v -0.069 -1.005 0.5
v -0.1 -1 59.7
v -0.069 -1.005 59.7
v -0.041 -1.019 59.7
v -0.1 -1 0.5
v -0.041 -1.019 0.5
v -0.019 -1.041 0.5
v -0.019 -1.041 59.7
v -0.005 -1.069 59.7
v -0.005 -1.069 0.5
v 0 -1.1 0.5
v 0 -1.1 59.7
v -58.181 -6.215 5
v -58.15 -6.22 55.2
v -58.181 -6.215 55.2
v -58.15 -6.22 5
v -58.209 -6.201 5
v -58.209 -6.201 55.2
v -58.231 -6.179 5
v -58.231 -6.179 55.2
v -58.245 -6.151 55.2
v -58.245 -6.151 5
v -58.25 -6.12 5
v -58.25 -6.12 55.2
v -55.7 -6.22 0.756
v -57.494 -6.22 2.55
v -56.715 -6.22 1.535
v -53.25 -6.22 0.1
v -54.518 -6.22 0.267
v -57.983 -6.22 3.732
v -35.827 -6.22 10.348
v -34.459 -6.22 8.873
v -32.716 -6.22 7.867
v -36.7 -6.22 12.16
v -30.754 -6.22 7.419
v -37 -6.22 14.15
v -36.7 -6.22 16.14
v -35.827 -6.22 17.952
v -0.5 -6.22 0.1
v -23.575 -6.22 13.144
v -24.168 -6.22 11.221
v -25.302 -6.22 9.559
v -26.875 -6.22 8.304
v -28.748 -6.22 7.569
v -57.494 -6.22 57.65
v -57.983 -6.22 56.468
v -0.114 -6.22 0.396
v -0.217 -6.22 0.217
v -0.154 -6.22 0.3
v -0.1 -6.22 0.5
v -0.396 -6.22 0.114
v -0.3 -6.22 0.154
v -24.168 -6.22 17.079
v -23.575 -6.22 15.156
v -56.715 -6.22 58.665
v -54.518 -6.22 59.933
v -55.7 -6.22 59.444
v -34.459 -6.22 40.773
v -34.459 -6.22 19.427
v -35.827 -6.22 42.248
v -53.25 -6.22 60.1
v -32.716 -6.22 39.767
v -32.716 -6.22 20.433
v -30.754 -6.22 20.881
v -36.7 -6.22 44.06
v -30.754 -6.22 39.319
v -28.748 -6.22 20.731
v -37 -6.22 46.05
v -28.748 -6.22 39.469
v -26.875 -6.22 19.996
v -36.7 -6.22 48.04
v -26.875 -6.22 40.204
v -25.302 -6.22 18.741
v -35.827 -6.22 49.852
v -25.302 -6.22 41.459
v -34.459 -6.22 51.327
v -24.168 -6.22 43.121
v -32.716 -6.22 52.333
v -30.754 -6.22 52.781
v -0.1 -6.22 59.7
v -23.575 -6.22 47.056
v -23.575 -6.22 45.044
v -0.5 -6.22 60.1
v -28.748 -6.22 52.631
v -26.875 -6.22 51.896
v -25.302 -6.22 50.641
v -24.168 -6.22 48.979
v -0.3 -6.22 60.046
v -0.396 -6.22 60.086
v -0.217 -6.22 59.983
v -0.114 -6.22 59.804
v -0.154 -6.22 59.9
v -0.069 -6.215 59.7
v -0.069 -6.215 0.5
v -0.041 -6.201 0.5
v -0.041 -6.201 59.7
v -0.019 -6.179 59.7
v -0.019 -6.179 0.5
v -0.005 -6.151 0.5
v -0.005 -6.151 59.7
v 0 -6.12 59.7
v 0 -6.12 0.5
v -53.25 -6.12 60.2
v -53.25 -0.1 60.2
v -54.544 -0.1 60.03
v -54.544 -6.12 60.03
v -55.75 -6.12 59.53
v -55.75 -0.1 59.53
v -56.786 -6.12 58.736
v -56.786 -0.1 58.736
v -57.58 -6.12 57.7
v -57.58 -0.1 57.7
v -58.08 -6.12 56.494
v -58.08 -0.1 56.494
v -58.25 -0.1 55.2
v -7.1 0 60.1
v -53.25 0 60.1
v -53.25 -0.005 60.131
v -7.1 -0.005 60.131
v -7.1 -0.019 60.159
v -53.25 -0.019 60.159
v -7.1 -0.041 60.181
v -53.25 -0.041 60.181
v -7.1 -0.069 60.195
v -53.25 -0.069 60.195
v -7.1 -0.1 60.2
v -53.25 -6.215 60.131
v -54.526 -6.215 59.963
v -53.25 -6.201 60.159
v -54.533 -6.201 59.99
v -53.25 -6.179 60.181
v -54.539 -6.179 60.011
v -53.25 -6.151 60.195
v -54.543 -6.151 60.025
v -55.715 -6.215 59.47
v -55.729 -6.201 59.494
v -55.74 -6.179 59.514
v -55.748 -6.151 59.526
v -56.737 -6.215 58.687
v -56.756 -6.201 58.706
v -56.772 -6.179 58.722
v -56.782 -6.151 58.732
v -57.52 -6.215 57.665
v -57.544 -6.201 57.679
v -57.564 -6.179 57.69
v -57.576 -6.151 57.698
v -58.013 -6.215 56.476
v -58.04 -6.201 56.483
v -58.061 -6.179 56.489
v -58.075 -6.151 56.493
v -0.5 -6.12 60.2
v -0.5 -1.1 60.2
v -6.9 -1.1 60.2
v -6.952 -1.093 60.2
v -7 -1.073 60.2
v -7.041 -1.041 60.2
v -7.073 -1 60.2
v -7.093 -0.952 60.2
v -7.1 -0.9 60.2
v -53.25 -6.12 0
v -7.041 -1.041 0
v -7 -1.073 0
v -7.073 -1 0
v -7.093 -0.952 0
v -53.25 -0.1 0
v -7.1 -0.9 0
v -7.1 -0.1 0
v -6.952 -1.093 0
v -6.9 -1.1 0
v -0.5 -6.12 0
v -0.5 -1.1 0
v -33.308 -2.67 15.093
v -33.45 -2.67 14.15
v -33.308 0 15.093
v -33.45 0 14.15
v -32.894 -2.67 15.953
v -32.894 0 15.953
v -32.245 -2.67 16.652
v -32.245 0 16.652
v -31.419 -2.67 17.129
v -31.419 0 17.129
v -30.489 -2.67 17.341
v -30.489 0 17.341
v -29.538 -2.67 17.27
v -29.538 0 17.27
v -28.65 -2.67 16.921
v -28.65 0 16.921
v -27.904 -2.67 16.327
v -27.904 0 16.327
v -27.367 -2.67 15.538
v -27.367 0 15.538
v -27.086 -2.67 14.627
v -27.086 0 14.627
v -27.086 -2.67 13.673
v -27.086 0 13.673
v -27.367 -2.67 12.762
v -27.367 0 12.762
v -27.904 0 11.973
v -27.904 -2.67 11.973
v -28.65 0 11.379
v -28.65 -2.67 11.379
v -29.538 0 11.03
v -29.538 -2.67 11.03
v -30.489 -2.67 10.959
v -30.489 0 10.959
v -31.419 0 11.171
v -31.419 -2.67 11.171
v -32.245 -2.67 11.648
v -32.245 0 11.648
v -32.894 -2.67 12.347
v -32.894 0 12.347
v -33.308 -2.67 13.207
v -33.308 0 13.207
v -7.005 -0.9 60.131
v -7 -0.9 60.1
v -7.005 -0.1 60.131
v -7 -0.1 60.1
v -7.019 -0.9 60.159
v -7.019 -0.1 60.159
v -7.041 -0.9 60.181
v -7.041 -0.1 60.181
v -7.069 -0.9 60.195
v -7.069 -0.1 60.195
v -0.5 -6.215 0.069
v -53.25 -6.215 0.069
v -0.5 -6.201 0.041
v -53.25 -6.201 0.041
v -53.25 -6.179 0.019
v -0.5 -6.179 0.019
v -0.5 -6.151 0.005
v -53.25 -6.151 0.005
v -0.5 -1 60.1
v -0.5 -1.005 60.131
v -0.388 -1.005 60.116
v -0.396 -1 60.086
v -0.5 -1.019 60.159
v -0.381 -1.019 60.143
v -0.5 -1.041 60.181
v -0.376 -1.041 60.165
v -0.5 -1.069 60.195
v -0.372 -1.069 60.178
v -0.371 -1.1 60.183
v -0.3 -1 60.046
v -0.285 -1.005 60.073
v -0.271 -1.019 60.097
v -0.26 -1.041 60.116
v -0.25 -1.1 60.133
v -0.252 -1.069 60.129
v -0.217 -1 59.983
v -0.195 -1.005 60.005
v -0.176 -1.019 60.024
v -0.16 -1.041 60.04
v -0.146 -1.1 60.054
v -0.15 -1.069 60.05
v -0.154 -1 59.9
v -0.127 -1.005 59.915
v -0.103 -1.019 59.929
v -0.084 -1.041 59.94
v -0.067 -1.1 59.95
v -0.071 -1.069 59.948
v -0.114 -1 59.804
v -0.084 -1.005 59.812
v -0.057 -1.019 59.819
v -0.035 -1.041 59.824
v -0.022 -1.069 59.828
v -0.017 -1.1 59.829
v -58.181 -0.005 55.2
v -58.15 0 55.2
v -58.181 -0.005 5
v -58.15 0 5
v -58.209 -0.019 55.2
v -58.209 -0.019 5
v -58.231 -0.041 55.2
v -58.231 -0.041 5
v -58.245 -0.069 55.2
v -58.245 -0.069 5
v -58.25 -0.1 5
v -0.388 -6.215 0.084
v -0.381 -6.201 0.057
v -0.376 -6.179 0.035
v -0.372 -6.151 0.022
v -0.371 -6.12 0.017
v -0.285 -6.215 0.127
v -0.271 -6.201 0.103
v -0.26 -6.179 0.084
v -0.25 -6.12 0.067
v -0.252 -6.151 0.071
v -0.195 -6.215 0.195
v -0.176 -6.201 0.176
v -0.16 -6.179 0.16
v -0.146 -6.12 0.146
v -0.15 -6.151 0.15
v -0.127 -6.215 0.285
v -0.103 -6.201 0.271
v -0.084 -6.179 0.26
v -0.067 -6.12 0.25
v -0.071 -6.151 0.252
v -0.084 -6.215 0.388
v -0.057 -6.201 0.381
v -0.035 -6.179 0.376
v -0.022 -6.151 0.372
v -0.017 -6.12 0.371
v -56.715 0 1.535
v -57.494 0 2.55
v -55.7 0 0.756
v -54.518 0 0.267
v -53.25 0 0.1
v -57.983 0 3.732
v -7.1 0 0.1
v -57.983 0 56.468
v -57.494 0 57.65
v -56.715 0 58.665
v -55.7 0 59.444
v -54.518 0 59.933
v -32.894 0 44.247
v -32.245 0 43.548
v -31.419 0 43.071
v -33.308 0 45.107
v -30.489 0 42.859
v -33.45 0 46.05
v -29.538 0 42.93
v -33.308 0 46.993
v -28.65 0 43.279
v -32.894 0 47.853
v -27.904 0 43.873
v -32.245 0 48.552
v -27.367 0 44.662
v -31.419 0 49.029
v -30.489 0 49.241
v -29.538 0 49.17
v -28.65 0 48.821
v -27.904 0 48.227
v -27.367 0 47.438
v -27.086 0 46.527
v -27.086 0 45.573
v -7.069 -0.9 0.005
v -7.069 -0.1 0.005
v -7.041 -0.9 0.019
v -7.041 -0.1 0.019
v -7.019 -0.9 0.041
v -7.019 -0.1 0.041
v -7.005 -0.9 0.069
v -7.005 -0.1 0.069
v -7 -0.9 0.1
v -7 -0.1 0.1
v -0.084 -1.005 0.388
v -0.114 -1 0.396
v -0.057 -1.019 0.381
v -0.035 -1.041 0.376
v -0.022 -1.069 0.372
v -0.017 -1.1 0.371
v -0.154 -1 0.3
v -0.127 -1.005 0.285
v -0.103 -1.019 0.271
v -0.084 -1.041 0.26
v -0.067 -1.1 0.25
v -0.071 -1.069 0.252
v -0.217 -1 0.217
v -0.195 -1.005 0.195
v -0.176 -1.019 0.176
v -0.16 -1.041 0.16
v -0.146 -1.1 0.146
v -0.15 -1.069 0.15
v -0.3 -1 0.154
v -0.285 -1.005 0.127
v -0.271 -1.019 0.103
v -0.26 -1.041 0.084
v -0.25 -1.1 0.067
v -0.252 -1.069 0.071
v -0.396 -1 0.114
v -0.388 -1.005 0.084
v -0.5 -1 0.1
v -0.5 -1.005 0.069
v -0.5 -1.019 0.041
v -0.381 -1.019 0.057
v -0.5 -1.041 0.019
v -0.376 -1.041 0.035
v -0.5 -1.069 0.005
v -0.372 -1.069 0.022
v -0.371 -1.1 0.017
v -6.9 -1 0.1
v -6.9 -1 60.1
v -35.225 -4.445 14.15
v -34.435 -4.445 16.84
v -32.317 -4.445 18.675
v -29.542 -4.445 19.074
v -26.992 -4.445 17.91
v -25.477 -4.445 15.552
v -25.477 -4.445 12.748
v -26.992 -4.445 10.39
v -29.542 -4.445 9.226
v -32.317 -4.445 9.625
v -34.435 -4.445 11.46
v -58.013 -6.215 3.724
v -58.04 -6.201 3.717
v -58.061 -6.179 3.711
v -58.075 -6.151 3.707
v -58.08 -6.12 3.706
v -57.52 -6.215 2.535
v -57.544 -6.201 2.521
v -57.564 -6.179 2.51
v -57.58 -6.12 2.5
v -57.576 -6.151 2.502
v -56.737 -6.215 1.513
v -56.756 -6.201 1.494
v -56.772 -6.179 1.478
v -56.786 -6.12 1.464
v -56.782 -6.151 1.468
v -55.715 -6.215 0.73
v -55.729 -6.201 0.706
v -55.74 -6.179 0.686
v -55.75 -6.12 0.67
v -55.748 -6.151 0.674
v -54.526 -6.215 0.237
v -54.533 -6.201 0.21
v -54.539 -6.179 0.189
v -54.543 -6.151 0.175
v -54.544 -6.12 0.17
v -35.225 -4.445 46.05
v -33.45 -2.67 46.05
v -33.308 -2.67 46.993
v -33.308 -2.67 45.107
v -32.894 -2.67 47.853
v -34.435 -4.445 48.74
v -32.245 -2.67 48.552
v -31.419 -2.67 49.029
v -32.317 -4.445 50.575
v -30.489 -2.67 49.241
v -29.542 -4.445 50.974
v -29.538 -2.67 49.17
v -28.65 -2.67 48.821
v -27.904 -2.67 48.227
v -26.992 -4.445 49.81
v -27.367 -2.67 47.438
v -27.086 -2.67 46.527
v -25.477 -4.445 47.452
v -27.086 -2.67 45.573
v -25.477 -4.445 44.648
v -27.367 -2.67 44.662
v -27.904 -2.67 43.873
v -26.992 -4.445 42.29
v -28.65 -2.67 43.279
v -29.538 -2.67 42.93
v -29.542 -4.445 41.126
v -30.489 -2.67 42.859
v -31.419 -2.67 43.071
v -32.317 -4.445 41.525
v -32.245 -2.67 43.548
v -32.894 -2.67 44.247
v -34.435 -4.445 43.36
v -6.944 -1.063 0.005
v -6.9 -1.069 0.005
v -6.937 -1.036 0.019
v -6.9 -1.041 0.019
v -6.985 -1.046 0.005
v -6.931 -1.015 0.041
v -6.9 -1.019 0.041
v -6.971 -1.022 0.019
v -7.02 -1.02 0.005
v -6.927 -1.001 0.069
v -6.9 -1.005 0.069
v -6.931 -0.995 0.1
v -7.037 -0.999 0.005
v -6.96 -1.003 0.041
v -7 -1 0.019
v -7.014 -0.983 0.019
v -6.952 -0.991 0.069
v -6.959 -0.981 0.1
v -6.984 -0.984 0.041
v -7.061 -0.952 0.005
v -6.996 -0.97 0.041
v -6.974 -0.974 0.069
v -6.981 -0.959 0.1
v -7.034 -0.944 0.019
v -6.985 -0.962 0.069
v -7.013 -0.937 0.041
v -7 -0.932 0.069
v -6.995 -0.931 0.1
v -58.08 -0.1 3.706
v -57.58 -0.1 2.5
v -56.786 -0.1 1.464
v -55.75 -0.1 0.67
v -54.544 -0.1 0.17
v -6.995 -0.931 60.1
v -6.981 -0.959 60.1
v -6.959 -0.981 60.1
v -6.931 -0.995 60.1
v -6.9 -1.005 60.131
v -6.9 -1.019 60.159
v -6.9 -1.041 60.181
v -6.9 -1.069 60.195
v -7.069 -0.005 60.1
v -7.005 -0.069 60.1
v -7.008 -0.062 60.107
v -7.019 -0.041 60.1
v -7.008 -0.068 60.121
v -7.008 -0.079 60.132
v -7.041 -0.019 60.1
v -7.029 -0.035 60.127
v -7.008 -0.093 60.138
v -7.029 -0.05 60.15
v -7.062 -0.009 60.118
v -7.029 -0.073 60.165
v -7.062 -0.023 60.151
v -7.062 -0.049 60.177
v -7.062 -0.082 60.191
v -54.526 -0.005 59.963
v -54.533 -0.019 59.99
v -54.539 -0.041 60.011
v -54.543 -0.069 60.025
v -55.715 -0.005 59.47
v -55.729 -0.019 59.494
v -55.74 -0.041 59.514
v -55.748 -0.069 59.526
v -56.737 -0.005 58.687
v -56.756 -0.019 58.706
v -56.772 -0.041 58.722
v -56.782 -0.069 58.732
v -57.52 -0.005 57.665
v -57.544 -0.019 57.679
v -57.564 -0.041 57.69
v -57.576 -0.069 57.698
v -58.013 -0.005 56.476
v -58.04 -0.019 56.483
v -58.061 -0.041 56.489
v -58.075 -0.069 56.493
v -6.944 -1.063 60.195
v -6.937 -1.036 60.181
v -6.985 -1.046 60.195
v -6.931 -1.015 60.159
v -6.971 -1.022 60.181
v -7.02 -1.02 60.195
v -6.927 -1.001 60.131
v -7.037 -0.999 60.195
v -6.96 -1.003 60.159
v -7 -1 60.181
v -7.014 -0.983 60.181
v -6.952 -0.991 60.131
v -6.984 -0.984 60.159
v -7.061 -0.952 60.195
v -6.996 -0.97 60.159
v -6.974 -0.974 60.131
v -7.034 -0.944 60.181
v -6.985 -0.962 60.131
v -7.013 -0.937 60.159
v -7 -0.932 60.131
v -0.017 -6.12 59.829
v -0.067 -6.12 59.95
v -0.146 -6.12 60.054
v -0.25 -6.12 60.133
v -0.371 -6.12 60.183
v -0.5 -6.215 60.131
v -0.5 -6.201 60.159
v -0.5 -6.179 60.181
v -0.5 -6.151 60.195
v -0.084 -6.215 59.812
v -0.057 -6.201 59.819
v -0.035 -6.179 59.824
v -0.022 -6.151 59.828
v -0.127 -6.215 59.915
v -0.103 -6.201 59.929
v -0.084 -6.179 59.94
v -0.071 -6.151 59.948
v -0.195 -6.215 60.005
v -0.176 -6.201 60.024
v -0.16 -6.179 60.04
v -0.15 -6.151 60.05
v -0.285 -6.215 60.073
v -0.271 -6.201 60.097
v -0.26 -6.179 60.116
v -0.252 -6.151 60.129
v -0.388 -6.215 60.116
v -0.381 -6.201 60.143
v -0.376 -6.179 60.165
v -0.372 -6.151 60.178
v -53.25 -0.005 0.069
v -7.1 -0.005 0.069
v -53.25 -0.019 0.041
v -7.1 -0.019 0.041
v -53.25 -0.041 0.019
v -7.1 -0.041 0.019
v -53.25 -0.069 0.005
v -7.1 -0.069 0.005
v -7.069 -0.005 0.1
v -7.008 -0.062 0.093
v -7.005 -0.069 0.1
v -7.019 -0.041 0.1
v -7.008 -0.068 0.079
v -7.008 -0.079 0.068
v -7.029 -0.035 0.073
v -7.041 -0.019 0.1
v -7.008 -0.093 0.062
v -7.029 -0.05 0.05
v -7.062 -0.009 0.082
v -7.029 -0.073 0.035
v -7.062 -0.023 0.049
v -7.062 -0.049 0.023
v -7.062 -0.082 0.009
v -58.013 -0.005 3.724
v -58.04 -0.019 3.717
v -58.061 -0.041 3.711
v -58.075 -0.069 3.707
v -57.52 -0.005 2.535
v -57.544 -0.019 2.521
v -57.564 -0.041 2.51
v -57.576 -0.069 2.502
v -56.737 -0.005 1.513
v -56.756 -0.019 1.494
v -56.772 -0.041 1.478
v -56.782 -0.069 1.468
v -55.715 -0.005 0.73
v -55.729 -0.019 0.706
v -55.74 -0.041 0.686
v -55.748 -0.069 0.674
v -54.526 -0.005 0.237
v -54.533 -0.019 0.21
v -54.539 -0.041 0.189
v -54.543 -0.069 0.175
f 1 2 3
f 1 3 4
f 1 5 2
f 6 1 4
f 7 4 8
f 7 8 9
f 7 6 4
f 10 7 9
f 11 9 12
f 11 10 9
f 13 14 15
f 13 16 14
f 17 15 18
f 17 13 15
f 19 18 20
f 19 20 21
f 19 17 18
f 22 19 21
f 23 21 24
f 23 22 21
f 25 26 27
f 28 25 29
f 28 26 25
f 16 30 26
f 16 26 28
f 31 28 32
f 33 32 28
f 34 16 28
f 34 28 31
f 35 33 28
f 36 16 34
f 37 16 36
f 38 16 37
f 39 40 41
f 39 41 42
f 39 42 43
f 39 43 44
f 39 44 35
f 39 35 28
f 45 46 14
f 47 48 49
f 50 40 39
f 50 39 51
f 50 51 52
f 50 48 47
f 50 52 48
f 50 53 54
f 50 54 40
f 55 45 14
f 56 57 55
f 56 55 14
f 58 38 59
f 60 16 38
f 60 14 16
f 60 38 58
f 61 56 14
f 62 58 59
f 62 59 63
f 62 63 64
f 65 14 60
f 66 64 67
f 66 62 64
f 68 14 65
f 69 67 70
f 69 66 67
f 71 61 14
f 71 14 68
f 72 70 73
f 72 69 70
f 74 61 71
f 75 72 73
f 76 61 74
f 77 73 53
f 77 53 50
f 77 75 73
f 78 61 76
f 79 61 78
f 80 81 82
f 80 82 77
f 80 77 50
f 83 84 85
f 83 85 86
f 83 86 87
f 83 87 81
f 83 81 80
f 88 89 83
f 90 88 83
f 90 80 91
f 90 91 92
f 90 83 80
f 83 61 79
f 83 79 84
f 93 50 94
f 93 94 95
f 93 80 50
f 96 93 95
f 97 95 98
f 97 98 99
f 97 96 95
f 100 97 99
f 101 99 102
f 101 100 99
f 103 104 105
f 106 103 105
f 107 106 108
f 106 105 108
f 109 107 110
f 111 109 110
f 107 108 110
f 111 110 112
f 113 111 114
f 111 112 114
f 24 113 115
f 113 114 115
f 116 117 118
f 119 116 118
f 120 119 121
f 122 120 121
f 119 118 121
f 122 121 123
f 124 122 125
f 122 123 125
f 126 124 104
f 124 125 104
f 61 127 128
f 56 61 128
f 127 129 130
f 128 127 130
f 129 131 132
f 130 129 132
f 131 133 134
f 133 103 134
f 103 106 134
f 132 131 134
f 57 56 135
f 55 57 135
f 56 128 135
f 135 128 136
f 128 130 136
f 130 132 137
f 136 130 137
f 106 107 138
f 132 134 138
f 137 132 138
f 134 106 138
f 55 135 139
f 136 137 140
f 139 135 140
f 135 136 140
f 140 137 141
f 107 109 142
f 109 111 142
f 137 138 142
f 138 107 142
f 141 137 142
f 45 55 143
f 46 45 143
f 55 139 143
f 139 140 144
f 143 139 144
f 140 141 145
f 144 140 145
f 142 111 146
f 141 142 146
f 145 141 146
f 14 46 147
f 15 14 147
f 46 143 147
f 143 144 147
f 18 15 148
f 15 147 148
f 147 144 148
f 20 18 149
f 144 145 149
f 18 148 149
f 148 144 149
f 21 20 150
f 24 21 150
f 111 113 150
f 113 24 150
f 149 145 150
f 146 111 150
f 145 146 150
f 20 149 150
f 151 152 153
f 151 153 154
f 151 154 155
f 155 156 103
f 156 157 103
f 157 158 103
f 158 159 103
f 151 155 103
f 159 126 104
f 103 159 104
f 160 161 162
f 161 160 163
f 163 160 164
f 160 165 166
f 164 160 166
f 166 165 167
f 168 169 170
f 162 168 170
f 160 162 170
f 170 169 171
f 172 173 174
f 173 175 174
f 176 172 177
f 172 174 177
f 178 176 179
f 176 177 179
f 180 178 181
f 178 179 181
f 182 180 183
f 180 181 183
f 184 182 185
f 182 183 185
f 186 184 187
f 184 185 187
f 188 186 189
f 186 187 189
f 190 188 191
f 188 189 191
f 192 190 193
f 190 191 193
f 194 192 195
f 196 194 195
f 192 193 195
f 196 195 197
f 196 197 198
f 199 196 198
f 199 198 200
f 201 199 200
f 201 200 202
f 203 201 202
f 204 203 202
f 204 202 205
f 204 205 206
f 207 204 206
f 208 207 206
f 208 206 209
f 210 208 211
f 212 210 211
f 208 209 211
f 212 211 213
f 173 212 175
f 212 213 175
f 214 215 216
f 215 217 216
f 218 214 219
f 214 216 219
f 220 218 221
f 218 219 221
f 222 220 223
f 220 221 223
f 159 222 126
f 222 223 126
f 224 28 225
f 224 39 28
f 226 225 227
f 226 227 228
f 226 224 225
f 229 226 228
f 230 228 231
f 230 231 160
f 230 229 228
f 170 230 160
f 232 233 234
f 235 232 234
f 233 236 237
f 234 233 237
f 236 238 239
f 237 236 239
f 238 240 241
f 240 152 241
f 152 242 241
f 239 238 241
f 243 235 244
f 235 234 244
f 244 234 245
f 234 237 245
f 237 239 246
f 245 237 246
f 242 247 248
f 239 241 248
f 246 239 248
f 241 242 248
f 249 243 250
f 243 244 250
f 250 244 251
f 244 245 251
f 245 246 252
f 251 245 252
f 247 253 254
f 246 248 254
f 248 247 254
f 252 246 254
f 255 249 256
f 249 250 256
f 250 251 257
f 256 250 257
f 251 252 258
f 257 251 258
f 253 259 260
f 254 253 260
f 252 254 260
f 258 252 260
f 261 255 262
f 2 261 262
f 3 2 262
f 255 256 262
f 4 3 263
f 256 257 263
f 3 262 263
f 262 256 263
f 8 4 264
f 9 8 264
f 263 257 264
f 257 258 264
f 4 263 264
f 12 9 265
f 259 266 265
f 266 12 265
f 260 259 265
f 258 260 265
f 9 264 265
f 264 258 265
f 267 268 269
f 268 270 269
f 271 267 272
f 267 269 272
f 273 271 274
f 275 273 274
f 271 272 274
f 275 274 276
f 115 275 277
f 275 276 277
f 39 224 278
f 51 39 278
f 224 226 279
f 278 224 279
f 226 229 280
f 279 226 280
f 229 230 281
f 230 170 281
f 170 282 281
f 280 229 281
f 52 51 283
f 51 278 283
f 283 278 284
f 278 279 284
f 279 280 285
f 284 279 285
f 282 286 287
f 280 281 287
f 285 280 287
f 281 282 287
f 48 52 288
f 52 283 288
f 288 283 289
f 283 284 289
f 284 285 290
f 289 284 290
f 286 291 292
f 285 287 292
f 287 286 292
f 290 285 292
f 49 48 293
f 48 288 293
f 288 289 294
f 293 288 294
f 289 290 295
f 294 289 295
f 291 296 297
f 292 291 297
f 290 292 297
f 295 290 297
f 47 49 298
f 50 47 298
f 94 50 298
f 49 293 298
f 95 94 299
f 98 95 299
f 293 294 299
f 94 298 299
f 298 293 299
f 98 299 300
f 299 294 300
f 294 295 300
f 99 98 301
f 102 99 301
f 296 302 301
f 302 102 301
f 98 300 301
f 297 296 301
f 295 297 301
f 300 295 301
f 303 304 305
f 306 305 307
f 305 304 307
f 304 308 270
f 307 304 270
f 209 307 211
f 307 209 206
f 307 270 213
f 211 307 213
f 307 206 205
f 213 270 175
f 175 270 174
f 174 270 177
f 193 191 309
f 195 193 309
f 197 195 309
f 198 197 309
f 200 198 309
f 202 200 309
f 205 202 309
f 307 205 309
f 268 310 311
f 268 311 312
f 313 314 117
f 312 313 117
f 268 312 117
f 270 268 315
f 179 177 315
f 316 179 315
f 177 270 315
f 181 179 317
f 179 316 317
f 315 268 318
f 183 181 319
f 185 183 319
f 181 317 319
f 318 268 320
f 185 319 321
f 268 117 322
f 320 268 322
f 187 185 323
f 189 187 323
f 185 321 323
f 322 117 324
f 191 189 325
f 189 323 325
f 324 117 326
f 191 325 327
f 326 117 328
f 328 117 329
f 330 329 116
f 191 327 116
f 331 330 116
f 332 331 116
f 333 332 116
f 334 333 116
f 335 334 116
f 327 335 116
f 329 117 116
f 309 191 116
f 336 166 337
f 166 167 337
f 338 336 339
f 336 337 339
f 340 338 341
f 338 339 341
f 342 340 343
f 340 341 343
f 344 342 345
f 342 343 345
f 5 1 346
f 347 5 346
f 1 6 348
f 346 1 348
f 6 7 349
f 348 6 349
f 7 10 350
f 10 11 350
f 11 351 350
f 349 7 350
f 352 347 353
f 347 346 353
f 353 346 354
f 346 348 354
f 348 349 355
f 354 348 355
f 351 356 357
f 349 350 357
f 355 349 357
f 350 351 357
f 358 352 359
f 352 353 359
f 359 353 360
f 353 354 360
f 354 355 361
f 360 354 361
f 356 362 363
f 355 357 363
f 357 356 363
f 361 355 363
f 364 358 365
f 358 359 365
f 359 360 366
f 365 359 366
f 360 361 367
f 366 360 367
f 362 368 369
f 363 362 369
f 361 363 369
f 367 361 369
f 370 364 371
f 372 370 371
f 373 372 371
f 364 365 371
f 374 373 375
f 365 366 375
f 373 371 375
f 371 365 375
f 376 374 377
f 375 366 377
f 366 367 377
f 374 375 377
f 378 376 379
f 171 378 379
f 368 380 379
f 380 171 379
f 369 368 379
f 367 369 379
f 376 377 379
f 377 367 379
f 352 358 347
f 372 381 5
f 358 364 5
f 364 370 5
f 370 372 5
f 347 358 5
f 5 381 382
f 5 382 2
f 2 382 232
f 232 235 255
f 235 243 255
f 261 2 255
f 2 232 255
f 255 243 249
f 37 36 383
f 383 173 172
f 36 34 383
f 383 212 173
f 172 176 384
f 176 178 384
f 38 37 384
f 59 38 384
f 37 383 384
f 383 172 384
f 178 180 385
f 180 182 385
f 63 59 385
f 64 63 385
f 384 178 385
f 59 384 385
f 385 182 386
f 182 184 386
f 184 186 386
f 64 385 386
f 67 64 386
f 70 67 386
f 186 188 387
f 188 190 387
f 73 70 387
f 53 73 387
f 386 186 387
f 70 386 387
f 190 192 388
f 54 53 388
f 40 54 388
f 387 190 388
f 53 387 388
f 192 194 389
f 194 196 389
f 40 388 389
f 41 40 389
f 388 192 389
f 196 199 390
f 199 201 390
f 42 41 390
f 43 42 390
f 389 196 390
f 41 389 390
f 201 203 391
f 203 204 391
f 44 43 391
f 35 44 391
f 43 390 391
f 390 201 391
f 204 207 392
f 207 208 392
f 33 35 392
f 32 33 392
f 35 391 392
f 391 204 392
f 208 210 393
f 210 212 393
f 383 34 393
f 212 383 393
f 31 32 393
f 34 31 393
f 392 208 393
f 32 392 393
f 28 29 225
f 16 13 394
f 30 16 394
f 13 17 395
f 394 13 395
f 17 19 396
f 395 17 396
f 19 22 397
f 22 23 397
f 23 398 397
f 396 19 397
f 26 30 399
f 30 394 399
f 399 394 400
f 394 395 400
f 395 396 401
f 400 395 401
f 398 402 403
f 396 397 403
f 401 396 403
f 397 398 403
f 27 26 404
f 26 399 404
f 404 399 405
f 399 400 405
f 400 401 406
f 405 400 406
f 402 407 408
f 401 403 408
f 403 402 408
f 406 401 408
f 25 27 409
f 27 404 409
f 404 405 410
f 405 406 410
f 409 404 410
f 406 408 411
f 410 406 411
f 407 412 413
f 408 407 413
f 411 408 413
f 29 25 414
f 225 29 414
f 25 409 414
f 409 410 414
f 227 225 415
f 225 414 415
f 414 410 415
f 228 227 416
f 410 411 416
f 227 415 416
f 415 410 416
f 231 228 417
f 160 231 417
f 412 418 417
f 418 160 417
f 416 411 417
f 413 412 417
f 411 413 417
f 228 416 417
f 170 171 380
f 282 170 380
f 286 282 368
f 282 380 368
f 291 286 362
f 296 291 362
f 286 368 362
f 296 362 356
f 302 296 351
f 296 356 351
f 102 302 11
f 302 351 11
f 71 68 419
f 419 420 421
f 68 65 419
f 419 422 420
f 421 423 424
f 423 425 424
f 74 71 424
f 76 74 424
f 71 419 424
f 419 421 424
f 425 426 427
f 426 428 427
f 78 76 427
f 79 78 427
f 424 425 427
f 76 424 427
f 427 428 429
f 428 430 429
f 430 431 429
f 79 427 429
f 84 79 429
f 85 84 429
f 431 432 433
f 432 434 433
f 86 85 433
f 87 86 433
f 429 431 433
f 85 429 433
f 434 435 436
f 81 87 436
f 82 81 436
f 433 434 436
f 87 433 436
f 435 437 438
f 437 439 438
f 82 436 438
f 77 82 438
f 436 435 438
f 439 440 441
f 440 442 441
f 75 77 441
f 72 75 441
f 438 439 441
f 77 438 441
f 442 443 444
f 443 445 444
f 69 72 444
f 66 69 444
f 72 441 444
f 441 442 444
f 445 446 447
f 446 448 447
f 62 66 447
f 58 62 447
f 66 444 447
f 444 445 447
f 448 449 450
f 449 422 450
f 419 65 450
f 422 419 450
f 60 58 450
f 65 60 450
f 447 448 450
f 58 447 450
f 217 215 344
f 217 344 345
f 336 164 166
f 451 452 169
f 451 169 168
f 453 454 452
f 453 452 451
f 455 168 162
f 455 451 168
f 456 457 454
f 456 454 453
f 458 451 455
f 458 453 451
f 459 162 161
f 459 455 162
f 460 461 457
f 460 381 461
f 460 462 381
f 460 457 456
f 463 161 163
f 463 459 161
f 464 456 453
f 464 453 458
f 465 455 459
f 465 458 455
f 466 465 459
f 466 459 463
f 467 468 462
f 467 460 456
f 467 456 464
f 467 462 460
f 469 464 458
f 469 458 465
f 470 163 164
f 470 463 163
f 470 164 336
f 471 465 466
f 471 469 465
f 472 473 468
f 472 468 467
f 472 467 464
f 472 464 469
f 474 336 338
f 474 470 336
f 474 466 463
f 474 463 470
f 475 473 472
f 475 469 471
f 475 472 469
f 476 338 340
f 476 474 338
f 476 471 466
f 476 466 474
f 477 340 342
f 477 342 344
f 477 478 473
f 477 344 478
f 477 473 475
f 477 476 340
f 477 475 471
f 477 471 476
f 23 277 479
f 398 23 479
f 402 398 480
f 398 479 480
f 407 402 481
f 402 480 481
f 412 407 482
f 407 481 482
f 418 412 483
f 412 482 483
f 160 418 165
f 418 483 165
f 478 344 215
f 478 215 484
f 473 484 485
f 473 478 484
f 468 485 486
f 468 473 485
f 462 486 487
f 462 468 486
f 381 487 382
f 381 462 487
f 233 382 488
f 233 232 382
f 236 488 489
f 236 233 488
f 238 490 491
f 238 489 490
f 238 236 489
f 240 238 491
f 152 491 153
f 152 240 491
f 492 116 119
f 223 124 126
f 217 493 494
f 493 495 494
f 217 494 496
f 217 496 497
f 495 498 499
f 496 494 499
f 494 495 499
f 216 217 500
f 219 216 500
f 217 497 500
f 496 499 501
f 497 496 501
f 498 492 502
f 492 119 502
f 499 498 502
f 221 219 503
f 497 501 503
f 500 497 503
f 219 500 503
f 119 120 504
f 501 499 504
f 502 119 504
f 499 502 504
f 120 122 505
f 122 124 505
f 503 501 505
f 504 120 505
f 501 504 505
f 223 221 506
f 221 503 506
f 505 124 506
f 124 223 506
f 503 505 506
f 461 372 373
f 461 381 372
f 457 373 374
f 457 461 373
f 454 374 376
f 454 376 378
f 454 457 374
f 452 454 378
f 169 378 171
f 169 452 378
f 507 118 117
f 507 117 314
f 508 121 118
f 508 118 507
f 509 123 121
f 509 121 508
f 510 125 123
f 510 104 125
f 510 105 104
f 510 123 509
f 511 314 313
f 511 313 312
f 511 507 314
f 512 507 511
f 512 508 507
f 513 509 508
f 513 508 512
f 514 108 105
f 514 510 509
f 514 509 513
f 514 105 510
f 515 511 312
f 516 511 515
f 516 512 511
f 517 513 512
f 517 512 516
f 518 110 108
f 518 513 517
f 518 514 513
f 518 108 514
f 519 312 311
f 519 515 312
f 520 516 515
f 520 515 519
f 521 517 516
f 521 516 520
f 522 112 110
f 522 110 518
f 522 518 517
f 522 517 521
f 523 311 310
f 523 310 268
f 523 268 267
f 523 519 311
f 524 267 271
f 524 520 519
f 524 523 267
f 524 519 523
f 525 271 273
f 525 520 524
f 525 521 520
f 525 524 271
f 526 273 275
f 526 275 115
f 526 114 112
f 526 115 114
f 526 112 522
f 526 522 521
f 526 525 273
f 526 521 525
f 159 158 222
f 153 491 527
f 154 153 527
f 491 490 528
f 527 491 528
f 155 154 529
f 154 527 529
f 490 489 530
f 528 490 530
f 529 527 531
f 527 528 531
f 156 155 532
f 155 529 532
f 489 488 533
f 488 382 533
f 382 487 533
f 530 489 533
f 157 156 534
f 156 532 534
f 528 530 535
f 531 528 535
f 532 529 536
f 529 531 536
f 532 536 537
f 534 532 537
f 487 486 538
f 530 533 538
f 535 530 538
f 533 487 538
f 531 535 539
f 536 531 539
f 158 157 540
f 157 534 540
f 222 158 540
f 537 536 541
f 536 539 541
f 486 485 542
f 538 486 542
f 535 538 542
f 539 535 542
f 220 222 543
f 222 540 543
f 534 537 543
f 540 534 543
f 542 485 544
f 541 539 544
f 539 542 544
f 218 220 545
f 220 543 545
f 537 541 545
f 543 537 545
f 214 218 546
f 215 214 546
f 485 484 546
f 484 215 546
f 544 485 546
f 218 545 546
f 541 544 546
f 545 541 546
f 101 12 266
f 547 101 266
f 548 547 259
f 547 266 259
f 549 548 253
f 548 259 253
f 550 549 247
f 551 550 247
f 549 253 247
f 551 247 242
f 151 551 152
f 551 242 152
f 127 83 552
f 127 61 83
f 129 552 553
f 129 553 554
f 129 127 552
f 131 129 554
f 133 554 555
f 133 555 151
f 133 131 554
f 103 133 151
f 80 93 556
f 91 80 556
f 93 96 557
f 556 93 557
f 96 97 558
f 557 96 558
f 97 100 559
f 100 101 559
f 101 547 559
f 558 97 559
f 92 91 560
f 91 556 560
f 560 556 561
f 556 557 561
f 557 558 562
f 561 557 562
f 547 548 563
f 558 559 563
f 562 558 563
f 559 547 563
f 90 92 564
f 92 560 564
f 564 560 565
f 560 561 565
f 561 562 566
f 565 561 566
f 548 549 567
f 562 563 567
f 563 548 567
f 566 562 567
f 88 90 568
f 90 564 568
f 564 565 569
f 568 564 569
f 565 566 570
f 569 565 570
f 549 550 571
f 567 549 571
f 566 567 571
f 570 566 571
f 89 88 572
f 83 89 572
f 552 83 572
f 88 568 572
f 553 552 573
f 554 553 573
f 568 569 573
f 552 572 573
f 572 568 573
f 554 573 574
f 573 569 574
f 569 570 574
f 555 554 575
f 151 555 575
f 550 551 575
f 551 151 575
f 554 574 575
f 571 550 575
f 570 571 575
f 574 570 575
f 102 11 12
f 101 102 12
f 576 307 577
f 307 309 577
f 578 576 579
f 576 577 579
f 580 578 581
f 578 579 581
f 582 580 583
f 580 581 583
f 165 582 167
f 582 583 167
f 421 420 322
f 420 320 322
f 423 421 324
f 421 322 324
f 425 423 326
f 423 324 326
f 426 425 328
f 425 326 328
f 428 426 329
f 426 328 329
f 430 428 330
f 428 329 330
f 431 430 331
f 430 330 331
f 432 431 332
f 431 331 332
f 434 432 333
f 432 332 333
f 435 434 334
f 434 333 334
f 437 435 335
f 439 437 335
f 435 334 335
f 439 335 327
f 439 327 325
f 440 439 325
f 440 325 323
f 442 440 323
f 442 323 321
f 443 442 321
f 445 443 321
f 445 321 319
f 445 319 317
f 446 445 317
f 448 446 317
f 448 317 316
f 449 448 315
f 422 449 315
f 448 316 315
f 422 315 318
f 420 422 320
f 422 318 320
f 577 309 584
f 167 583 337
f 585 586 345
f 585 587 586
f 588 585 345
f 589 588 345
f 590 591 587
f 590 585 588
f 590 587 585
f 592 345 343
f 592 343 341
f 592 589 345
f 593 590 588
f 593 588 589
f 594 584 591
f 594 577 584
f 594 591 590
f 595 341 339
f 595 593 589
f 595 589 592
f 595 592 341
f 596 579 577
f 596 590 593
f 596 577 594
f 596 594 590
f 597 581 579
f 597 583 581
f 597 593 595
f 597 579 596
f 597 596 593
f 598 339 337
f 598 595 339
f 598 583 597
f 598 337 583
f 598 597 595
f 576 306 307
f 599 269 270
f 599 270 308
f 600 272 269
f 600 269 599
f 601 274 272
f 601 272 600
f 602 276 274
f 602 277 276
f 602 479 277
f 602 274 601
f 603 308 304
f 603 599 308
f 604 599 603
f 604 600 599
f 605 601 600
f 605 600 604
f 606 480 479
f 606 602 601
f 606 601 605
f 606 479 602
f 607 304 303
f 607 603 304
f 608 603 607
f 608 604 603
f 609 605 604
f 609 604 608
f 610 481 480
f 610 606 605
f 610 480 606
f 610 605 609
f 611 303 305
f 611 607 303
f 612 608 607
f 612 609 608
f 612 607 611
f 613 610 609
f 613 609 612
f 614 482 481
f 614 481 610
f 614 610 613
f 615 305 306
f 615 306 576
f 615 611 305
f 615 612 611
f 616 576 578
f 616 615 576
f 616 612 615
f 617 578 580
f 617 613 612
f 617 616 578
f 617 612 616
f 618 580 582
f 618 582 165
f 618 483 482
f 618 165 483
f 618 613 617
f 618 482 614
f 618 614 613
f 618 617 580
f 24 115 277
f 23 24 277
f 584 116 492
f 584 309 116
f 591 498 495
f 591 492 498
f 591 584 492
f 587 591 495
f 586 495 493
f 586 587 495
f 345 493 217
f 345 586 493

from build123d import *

# Parameters (mm, degrees)
F1_DEPTH       = 6.22
F2_W           = 7
F2_H           = 1
F3_DEPTH       = 60.201
F4_R           = 0.1
F6_D           = 6.4
F6_CSINK_D     = 13.5
F6_CSINK_ANGLE = 90


with BuildPart() as f1:
    # F0 (on Front) → F1 (new body)
    with BuildSketch(Plane.XZ):
        with BuildLine():
            Line((-53.25, 0), (-0.5, 0))
            ThreePointArc((-0.5, 0), (-0.1464466094, 0.1464466094), (0, 0.5))
            Line((0, 0.5), (0, 59.7))
            ThreePointArc((0, 59.7), (-0.1464466094, 60.0535533906), (-0.5, 60.2))
            Line((-0.5, 60.2), (-53.25, 60.2))
            ThreePointArc((-53.25, 60.2), (-56.7855339059, 58.7355339059), (-58.25, 55.2))
            Line((-58.25, 55.2), (-58.25, 5))
            ThreePointArc((-58.25, 5), (-56.7855339059, 1.4644660941), (-53.25, 0))
        make_face()
    extrude(amount=F1_DEPTH)

    # F2 (on face) → F3 (cut, through all)
    with BuildSketch(Plane.XY.offset(60.2)):
        with Locations((-3.5, -0.5)):
            Rectangle(F2_W, F2_H)
    extrude(amount=-F3_DEPTH, mode=Mode.SUBTRACT)

    # F4
    f4_edges = [f1.edges().sort_by_distance(p)[0] for p in [
        (-26.875, -6.22, 60.2),
        (-30.125, 0, 60.2),
        (-7, 0, 30.1),
        (-3.75, -1, 60.2),
        (-7, -0.5, 60.2),
        (-7, -0.5, 0),
        (-7, -1, 30.1),
    ]]
    fillet(f4_edges, radius=F4_R)

    # F6 (through all)
    with Locations(Plane.XZ.offset(6.22)):
        with Locations((-30.25, 46.05), (-30.25, 14.15)):
            CounterSinkHole(F6_D / 2, F6_CSINK_D / 2, counter_sink_angle=F6_CSINK_ANGLE)


solid = f1.part
